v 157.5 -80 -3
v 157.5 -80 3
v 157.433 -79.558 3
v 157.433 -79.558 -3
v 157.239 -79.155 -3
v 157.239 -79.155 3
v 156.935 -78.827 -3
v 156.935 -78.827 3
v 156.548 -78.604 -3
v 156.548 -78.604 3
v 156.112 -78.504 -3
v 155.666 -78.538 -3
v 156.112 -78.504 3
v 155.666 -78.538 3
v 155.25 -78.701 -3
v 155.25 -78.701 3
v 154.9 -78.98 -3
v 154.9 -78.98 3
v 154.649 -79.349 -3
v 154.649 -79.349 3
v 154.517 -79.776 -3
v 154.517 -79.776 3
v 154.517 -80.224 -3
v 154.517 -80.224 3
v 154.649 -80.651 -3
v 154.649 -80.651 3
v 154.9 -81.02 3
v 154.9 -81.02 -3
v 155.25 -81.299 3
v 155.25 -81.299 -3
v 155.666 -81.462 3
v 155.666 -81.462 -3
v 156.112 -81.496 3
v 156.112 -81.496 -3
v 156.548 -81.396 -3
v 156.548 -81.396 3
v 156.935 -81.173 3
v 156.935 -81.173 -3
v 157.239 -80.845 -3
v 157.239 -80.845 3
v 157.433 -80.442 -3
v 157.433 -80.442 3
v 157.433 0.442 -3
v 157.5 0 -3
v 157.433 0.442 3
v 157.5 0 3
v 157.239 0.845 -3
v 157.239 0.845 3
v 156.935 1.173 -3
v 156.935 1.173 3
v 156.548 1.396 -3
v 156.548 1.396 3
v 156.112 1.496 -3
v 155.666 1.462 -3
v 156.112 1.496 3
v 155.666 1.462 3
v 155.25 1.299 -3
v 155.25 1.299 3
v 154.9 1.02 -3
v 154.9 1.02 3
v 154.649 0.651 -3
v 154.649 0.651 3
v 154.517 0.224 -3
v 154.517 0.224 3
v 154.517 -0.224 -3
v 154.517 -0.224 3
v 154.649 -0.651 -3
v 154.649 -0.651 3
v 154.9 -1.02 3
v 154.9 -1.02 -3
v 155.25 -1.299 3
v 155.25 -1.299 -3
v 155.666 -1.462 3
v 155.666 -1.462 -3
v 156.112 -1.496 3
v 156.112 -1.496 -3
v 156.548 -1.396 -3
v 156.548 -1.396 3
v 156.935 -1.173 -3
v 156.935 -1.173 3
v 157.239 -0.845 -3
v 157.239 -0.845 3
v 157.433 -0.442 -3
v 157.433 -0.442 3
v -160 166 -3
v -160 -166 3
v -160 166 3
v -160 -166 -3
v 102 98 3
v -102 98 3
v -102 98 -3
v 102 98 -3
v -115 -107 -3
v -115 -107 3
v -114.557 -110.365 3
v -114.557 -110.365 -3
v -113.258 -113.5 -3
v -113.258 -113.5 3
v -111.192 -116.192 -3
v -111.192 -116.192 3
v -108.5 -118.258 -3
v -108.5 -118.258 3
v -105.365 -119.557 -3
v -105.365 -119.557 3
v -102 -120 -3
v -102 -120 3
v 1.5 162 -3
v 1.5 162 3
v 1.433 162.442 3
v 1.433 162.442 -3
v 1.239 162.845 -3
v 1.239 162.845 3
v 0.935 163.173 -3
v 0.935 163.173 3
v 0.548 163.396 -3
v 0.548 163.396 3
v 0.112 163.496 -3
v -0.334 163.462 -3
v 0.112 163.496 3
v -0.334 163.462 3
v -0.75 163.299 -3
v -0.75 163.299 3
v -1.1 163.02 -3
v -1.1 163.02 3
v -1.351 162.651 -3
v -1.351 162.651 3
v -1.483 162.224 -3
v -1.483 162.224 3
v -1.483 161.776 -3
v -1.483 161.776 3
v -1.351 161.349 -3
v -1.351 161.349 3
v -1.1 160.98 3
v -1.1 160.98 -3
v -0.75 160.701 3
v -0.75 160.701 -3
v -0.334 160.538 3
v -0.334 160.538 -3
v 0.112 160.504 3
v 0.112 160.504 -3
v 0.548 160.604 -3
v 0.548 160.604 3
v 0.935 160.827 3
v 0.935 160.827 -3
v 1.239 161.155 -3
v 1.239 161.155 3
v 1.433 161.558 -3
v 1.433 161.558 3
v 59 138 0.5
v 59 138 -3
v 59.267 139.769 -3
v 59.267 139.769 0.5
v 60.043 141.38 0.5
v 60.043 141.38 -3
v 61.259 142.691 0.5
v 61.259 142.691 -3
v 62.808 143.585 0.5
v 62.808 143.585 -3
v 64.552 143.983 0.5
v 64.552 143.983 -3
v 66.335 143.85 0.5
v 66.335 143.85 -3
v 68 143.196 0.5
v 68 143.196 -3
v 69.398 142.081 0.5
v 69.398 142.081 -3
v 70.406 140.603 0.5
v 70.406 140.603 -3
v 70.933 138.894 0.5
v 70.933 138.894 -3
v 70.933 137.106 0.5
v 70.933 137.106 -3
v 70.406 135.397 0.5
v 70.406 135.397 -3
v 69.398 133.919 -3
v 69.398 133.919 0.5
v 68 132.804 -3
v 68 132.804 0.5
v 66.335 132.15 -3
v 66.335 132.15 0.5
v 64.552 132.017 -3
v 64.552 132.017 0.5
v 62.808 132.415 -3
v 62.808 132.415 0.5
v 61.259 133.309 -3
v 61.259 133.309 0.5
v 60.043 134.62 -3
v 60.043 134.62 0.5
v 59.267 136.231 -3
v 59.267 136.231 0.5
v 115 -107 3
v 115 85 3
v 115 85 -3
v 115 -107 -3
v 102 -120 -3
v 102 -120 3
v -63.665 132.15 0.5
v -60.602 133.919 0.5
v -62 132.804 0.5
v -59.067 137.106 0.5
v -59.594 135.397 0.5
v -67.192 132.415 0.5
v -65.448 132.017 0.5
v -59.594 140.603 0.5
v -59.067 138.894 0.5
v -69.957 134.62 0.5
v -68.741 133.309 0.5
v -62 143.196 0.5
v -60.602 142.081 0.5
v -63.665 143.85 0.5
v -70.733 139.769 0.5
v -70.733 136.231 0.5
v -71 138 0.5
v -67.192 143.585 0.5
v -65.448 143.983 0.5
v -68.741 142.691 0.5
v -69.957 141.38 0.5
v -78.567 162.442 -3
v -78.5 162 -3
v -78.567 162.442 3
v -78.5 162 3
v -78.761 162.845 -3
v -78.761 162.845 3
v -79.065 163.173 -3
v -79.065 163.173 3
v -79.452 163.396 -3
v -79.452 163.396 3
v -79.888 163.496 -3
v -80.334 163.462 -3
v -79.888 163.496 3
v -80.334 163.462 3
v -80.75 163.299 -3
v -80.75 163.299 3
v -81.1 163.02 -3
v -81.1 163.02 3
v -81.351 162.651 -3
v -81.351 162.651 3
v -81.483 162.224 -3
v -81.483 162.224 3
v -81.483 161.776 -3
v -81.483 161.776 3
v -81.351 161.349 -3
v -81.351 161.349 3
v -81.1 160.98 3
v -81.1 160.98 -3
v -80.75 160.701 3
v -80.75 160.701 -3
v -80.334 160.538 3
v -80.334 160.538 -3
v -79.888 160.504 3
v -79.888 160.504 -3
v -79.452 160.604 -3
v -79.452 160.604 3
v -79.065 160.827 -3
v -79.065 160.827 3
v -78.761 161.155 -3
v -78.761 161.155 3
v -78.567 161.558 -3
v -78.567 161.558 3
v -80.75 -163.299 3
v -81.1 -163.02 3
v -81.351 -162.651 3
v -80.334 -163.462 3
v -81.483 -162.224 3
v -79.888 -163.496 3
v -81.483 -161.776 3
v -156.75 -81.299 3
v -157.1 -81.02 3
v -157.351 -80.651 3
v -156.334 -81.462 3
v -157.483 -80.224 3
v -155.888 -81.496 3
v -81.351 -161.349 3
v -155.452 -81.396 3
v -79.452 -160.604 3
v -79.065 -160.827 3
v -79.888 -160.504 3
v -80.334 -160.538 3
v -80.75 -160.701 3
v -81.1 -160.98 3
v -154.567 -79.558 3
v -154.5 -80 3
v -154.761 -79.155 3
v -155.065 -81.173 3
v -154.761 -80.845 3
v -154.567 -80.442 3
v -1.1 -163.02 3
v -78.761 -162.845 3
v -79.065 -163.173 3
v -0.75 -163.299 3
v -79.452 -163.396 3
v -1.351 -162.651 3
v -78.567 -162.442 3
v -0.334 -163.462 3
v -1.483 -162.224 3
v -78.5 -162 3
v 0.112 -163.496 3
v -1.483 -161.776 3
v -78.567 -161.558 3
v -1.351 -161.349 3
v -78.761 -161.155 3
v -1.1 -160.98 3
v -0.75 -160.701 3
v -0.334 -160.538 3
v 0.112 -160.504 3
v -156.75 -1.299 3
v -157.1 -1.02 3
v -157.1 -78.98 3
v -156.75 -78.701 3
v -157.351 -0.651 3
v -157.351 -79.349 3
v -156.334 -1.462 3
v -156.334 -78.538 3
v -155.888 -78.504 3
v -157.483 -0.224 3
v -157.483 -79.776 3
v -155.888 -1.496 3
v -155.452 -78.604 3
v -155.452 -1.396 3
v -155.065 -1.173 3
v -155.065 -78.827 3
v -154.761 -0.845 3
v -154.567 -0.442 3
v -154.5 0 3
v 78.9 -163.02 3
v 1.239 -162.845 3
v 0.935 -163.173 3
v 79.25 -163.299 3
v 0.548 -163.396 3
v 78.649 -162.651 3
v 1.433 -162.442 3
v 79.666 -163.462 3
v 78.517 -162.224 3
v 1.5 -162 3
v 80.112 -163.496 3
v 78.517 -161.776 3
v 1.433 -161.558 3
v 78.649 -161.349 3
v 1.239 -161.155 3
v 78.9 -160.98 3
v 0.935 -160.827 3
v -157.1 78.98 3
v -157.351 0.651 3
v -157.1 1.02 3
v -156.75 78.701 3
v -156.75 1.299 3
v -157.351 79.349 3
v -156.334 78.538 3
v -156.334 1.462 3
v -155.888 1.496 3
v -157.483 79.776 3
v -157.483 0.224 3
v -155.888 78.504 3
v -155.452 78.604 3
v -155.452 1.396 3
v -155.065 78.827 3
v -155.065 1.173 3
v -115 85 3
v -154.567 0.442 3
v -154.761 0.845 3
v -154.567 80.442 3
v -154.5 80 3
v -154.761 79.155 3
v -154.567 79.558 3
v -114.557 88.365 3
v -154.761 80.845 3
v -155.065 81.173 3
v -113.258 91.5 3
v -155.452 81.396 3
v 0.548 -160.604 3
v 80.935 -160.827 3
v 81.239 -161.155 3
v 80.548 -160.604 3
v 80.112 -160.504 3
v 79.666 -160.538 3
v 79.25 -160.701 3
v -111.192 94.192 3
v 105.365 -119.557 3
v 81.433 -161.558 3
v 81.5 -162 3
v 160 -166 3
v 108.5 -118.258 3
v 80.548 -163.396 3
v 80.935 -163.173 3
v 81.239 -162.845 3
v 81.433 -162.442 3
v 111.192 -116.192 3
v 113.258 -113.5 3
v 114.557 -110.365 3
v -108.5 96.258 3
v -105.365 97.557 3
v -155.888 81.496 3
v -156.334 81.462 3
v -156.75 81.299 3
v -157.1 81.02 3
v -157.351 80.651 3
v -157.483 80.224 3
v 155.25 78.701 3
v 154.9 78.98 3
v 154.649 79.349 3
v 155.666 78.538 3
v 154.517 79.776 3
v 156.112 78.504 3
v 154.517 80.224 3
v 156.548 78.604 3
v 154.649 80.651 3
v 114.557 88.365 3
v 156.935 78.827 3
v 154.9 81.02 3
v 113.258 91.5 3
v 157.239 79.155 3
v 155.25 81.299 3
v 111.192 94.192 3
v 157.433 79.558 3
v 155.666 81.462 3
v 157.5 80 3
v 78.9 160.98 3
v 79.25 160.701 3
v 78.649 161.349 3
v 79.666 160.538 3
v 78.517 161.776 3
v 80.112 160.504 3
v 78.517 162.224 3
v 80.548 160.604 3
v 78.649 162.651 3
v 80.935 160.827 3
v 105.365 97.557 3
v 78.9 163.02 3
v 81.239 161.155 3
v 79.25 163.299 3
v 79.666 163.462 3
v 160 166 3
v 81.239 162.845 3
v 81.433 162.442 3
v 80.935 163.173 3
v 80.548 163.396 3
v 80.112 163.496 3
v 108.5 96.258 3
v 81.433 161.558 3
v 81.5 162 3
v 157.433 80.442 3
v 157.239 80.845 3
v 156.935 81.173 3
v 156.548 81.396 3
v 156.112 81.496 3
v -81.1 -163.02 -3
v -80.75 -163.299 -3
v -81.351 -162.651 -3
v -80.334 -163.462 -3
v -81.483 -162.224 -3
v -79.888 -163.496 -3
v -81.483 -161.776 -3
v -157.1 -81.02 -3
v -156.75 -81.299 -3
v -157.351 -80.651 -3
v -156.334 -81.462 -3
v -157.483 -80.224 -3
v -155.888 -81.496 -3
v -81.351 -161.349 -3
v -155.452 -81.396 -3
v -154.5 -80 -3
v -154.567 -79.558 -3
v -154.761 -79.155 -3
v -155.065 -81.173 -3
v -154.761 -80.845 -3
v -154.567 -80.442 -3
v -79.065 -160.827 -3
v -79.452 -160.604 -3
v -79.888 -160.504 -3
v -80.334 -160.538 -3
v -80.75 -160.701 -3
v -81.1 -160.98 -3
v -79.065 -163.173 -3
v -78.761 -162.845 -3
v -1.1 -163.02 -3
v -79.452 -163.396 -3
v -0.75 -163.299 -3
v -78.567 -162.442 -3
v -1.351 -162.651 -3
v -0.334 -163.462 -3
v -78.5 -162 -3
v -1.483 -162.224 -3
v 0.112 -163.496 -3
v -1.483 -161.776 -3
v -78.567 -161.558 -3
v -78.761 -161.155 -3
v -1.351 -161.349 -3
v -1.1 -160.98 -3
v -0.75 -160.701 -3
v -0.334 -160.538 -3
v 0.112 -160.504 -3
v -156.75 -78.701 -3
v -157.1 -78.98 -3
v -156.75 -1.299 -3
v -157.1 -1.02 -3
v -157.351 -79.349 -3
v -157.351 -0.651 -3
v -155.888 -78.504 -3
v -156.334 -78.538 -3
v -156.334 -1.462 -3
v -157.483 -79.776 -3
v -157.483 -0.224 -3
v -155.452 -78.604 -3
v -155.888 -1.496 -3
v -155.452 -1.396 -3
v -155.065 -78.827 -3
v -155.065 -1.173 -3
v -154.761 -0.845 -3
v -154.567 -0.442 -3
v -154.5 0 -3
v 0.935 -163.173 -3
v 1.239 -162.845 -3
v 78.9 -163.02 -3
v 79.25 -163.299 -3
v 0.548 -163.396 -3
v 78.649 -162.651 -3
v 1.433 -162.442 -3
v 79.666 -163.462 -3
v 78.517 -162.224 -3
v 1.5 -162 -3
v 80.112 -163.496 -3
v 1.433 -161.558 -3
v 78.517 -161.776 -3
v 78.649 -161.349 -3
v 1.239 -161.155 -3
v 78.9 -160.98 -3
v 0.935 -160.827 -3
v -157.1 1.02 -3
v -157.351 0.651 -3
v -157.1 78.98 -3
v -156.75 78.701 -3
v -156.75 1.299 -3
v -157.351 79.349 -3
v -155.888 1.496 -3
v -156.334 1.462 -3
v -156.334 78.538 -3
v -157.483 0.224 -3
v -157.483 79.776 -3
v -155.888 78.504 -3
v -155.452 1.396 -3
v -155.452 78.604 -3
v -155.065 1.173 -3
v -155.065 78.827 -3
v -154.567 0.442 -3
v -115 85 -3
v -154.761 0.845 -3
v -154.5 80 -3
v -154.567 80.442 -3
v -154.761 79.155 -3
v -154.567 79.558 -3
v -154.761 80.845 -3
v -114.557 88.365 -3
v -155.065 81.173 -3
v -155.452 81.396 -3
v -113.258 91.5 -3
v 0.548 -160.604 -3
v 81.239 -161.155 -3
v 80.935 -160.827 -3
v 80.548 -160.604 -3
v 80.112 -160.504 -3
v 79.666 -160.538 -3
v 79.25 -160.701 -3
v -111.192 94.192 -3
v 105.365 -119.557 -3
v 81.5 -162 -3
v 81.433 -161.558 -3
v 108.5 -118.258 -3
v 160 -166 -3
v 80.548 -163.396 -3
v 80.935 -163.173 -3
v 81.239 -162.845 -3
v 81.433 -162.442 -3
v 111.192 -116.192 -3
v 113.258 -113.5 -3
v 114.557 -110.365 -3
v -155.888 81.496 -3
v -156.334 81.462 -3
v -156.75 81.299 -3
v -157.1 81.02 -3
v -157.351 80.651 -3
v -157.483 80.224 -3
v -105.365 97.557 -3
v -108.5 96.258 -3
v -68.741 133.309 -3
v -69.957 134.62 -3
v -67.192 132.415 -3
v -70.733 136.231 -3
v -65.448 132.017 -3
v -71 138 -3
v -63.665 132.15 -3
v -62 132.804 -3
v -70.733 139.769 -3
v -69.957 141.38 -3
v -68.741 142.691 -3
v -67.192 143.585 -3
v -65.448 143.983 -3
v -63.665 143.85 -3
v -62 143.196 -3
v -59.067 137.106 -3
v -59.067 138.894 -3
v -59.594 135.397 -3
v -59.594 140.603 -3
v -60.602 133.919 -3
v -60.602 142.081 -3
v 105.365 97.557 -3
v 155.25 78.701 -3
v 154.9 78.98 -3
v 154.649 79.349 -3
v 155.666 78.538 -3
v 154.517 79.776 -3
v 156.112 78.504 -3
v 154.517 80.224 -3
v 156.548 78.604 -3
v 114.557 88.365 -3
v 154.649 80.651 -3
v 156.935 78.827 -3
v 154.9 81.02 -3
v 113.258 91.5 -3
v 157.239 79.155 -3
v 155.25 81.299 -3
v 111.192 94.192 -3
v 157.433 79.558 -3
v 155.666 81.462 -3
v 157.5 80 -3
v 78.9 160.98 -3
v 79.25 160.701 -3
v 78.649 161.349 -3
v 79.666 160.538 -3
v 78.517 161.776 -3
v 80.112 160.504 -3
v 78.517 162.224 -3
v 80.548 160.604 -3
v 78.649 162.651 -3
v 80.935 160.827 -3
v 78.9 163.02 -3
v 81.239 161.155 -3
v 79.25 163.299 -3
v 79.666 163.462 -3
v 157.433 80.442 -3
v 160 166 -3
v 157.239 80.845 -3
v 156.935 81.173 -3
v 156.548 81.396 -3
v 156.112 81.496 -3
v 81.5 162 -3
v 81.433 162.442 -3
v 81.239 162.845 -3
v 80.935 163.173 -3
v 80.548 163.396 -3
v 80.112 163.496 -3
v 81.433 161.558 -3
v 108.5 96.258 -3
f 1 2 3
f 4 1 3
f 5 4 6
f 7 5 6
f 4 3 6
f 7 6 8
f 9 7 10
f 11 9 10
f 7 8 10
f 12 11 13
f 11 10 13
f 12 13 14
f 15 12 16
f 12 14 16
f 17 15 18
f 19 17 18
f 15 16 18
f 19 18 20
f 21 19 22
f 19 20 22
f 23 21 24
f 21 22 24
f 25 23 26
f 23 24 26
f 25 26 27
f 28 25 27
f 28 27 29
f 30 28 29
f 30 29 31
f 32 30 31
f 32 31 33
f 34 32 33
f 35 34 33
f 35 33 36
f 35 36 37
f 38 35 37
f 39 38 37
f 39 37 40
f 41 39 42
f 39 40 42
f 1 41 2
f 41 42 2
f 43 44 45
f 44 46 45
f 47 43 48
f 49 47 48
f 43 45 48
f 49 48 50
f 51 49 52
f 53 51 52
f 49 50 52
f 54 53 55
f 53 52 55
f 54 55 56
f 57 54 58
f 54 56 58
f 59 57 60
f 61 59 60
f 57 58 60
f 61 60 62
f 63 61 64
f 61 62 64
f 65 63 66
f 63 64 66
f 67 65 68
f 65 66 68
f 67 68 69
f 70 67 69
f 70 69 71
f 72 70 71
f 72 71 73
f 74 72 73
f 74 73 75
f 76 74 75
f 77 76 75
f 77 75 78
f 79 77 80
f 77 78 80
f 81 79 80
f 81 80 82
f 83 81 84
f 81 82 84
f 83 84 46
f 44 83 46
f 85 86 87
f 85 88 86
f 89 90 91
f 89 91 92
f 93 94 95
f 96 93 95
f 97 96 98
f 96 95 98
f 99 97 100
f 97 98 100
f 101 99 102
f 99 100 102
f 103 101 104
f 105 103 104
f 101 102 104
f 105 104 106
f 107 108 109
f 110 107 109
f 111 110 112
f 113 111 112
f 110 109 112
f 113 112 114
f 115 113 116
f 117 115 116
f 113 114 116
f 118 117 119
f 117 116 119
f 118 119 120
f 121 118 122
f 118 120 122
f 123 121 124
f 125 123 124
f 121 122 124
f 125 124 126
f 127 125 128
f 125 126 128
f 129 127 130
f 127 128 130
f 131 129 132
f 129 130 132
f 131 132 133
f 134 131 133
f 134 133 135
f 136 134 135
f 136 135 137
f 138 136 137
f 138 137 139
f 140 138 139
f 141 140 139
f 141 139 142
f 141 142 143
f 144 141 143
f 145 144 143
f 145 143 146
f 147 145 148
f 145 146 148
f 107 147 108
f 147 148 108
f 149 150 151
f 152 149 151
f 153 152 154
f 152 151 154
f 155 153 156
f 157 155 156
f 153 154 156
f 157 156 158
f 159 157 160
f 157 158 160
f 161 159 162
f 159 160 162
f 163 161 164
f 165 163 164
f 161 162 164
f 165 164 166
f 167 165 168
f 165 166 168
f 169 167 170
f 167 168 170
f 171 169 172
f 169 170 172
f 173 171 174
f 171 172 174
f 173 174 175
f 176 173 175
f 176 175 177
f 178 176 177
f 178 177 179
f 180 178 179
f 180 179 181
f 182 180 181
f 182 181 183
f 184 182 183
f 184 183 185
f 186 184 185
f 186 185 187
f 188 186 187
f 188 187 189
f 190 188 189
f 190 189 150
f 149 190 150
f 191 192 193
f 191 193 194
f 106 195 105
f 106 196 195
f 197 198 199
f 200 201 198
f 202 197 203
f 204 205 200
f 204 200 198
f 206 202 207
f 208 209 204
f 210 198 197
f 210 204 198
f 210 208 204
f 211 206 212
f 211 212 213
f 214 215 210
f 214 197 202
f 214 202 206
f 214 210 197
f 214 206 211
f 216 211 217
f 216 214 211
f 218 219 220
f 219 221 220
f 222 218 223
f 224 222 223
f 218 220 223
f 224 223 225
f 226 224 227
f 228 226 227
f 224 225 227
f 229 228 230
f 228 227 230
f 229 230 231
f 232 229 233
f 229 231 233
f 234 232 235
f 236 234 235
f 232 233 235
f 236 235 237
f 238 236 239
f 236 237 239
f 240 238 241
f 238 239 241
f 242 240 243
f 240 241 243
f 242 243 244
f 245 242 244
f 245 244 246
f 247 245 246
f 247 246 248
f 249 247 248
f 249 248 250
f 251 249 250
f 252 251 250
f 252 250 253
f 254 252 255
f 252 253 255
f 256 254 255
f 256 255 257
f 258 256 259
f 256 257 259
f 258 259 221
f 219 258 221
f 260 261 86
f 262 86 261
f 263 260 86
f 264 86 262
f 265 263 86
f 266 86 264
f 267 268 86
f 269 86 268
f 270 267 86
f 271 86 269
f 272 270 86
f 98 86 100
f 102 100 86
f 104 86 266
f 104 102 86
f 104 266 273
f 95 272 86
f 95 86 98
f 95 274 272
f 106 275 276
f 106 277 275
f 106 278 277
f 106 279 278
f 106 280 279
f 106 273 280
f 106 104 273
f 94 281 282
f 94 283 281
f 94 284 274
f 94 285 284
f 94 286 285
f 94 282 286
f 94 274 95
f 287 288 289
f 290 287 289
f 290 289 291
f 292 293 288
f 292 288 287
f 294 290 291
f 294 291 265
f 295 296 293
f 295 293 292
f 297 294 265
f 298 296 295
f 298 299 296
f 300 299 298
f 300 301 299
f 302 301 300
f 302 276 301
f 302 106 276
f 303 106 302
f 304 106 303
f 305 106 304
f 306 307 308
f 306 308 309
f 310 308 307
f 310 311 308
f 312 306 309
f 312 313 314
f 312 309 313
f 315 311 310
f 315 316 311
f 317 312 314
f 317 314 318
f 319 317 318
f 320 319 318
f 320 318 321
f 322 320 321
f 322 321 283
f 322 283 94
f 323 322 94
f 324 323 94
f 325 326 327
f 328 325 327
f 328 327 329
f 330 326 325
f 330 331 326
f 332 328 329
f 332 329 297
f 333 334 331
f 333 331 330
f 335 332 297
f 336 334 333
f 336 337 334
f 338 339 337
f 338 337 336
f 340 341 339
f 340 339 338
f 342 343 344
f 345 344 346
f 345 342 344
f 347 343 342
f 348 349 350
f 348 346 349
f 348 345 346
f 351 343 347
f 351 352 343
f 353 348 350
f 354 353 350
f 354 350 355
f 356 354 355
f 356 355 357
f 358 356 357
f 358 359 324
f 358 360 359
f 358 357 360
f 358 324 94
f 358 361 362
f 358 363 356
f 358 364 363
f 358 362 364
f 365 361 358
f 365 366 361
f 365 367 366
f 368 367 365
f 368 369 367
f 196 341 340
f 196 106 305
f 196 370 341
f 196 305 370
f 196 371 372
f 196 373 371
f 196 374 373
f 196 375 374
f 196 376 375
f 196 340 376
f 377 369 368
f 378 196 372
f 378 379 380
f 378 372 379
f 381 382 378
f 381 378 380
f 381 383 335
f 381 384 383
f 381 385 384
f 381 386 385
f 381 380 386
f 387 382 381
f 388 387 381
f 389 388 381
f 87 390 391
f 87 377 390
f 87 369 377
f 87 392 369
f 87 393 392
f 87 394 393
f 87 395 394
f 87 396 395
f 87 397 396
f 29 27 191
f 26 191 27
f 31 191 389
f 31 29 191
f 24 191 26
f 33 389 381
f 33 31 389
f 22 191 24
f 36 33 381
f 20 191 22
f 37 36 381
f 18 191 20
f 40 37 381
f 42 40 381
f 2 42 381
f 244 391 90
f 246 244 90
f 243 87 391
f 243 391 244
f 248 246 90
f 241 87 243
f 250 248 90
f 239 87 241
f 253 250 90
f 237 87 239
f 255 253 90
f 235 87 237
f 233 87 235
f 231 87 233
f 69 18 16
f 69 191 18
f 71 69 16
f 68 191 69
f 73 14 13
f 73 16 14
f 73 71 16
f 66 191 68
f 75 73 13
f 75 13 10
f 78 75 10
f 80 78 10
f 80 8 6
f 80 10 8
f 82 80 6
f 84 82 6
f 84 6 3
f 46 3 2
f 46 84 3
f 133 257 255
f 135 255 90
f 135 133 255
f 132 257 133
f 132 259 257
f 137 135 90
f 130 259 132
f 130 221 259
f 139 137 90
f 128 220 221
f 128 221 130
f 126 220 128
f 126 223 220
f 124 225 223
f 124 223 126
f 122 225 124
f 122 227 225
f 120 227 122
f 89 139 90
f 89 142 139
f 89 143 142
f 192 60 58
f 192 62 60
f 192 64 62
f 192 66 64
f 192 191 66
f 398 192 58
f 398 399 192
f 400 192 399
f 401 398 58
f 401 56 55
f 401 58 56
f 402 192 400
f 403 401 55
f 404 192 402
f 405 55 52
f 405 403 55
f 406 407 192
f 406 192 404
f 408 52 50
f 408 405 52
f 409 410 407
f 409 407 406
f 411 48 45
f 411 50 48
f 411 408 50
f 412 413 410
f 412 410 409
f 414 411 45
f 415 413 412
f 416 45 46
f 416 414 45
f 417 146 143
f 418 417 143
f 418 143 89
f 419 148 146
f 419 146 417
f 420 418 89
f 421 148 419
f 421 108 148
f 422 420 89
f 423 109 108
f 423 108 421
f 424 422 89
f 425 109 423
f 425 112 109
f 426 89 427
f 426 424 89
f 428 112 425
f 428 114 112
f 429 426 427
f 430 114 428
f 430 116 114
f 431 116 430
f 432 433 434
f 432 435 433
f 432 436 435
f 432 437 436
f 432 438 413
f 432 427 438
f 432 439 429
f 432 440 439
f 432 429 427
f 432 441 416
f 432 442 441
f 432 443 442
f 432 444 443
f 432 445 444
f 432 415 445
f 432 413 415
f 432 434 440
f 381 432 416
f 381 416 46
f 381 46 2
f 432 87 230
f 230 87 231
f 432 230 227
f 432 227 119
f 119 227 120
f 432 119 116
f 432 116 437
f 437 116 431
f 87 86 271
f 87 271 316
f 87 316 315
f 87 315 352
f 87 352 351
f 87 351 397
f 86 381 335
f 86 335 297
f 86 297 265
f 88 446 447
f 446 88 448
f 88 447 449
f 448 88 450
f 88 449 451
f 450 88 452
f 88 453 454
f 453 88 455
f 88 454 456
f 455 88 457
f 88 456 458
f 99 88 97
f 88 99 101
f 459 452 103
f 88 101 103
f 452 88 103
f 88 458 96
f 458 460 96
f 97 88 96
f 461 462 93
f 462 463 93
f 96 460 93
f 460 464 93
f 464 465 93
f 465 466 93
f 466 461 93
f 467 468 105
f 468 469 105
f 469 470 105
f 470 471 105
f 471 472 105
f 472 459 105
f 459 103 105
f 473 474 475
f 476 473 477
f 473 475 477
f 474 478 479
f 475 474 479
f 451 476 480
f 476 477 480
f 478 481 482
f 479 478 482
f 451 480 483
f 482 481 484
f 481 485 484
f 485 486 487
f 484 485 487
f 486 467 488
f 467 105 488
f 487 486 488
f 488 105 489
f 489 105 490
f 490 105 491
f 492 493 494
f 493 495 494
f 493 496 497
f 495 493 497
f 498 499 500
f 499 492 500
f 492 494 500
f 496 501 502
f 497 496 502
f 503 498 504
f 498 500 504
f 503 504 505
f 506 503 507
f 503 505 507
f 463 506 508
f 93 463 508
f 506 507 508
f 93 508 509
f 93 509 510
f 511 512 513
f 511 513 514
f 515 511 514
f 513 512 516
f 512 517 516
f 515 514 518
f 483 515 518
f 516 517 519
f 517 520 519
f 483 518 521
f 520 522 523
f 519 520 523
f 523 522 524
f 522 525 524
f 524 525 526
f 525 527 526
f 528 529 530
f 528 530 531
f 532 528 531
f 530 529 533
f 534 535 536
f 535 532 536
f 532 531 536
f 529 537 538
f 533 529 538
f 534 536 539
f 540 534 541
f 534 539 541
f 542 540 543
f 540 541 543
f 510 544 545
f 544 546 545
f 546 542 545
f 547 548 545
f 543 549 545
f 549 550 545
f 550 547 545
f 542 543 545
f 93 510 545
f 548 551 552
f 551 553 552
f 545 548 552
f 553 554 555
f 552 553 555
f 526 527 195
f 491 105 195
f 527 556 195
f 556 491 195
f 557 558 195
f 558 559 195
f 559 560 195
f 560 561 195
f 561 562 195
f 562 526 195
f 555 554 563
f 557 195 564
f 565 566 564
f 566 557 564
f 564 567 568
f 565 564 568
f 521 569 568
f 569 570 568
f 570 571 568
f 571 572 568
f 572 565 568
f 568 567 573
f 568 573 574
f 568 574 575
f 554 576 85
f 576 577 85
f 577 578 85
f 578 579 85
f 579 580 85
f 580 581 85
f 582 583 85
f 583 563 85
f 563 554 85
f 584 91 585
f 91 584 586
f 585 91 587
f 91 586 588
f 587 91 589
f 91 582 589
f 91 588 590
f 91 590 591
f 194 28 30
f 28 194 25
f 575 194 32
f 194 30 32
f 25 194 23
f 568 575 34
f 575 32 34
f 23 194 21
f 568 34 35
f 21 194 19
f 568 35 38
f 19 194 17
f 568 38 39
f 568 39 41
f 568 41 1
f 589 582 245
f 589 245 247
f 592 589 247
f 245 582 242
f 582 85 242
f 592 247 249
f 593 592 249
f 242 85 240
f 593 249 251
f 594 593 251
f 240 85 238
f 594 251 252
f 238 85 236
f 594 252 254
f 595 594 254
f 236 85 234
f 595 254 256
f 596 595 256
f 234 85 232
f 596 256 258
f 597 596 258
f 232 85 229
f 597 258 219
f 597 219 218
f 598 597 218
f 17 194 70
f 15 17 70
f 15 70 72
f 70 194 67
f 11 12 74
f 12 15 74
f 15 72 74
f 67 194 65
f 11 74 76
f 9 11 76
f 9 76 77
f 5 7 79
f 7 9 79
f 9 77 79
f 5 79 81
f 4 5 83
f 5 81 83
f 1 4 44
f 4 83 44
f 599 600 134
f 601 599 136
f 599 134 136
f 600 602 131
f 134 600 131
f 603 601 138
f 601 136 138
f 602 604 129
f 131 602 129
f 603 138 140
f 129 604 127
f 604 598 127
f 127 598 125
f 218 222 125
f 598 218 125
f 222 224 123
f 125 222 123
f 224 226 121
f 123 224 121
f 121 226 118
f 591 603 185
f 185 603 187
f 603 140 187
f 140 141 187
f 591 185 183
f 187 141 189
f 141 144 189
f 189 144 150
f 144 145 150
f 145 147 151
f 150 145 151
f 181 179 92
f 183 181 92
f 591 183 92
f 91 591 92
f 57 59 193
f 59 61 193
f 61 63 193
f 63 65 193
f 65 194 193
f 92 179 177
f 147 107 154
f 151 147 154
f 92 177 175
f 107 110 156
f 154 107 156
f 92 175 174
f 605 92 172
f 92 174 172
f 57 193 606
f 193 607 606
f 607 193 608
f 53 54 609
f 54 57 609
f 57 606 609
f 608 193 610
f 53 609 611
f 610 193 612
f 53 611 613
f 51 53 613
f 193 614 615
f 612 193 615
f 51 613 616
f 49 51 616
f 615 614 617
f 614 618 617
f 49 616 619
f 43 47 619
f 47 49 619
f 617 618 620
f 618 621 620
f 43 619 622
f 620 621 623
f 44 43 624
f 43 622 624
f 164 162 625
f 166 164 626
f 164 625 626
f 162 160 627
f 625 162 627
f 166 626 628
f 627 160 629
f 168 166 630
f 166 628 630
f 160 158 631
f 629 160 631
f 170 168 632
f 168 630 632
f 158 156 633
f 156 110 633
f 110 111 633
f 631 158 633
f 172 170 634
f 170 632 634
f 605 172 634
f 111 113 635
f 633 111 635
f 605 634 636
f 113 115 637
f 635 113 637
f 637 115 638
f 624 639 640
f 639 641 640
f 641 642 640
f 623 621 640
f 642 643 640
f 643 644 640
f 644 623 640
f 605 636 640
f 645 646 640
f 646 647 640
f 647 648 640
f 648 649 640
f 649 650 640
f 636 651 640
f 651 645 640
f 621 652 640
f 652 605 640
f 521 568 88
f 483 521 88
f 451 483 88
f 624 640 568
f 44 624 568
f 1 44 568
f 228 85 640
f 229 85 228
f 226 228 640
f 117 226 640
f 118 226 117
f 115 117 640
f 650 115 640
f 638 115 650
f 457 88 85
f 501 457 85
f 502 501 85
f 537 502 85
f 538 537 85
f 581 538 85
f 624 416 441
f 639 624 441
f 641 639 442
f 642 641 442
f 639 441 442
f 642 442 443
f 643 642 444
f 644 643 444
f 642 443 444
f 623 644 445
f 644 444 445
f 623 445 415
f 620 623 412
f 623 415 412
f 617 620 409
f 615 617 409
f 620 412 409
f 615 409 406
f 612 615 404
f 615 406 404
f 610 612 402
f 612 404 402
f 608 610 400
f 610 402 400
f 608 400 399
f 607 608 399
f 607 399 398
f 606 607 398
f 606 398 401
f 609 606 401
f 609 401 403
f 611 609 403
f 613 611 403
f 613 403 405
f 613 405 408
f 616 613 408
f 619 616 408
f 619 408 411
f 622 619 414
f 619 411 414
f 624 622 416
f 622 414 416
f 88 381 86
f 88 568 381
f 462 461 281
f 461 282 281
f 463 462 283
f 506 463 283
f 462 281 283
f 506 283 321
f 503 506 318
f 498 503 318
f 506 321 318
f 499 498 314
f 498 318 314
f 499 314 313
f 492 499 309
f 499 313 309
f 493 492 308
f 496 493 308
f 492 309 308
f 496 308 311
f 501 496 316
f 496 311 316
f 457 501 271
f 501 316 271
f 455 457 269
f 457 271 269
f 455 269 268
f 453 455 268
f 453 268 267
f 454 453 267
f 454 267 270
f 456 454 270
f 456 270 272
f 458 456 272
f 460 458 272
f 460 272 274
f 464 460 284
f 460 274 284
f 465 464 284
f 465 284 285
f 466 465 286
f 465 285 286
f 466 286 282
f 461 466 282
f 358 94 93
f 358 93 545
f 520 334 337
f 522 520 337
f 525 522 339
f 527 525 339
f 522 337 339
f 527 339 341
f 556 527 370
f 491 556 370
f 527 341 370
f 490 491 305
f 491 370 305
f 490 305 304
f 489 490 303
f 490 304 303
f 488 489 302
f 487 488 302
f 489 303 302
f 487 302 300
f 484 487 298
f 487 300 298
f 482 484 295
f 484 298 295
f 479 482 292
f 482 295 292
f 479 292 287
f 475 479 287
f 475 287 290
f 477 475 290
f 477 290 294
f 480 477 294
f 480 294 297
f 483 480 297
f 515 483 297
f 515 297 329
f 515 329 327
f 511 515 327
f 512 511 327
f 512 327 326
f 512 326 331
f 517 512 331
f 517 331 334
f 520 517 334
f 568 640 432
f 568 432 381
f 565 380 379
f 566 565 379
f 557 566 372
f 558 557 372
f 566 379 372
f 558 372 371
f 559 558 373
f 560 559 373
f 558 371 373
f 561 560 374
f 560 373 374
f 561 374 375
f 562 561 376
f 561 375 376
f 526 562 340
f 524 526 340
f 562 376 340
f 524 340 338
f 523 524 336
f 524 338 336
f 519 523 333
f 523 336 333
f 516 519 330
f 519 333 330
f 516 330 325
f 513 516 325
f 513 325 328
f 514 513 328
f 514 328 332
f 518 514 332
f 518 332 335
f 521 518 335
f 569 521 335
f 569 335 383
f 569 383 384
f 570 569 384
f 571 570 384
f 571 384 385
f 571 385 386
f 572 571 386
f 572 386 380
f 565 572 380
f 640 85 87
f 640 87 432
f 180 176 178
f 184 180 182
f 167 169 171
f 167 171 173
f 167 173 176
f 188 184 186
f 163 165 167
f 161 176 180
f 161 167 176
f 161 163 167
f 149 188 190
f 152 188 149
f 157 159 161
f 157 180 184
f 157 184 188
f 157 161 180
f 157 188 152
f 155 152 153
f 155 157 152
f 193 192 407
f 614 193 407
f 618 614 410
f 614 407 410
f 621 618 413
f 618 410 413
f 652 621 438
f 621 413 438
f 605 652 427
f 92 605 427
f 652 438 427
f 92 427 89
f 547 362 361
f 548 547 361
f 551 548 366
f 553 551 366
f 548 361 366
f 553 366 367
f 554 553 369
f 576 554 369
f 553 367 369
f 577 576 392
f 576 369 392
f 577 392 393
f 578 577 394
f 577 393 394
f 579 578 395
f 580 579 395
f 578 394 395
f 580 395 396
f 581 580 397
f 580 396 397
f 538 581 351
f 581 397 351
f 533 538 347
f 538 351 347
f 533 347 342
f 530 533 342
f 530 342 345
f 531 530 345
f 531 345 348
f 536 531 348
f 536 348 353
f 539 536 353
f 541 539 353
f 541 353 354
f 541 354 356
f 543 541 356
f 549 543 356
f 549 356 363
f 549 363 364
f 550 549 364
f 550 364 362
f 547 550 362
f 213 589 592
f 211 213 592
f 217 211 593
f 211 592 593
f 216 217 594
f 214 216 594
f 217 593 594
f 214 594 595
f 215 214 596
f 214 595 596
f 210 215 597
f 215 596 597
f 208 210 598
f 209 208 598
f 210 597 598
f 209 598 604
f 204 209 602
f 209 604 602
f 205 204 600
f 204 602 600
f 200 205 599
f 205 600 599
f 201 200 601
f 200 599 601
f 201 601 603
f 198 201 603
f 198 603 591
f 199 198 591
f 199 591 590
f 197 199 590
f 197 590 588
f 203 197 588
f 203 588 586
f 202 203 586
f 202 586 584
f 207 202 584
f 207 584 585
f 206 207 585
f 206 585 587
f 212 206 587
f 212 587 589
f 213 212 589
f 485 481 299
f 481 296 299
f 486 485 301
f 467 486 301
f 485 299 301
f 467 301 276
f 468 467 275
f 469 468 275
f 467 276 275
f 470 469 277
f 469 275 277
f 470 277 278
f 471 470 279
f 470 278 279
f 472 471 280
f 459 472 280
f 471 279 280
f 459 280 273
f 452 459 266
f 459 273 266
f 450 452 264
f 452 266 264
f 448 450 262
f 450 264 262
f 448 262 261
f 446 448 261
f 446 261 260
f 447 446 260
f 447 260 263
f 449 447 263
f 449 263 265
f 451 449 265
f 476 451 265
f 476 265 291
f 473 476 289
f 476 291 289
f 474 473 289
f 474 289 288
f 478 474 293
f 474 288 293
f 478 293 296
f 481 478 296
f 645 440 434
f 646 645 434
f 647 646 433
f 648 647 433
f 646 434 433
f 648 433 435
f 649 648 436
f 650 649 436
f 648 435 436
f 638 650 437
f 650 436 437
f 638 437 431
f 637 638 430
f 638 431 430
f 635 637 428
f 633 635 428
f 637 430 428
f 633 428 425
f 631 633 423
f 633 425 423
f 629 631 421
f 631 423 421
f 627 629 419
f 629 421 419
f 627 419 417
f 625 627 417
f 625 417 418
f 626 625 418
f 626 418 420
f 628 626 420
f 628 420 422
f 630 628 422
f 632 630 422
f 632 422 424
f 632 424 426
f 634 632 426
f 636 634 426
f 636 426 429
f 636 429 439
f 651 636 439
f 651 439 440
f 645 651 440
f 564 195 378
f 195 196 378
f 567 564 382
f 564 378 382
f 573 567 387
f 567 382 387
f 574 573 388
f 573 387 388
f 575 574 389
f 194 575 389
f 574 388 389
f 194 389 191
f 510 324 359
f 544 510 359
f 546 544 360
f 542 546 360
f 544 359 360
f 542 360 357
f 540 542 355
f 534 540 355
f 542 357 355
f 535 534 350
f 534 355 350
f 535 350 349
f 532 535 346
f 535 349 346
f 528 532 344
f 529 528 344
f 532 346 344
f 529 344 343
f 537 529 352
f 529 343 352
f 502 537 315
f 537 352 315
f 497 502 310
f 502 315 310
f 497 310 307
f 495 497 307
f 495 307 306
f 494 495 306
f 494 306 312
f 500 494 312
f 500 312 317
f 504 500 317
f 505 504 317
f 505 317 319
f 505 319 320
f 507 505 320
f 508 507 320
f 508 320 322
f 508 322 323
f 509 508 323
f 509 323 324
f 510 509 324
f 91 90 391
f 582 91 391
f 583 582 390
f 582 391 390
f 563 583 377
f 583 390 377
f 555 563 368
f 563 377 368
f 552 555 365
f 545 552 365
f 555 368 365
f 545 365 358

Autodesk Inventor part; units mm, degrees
ref_plane "YZ Plane" through (0, 0, 0) normal (1, 0, 0) x (0, 1, 0)
ref_plane "XZ Plane" through (0, 0, 0) normal (0, 1, 0) x (-1, 0, 0)
ref_plane "XY Plane" through (0, 0, 0) normal (0, 0, 1) x (1, 0, 0)
sketch "Sketch1" plane through (0, 0, 0) normal (0, 0, 1) x (1, 0, 0)
  line L0 (-160, 166) -> (160, 166)
  line L1 (160, 166) -> (160, -166)
  line L2 (160, -166) -> (-160, -166)
  line L3 (-160, -166) -> (-160, 166)
  point P0 (0, 0)
  dimension "d0" = 320
  dimension "d1" = 332
  dimension "d2" = 160
  dimension "d3" = 166
extrude "Tykkelse" add sketch "Sketch1" along normal mid plane 6
sketch "Sketch2" plane through (0, 0, 3) normal (0, 0, 1) x (1, 0, 0)
  line L0 (-102, 98) -> (102, 98)
  line L1 (115, 85) -> (115, -107)
  line L2 (102, -120) -> (-102, -120)
  line L3 (-115, -107) -> (-115, 85)
  line L4 (160, -166) -> (160, 166) projected
  line L5 (-160, 166) -> (-160, -166) projected
  line L6 (-160, -166) -> (160, -166) projected
  line L7 (160, 166) -> (-160, 166) projected
  arc A0 (-102, 98) -> (-115, 85) centre (-102, 85) ccw
  arc A1 (115, 85) -> (102, 98) centre (102, 85) ccw
  arc A2 (102, -120) -> (115, -107) centre (102, -107) ccw
  arc A3 (-115, -107) -> (-102, -120) centre (-102, -107) ccw
  point P0 (0, 0)
  dimension "d6" = 45
  dimension "d7" = 45
  dimension "d8" = 46
  dimension "d9" = 68
  dimension "d10" = 13
  dimension "d20" = 218
  dimension "d21" = 230
extrude "Vindue" cut sketch "Sketch2" against normal up to surface (6 mm away) contours L0 A1 L1 A2 L2 A3 L3 A0
sketch "Sketch3" plane through (0, 0, -3) normal (0, 0, -1) x (-1, 0, 0)
  circle A0 centre (65, 138) radius 6
  circle A1 centre (-65, 138) radius 6
  line L0 (-65, 138) -> (65, 138) construction
  line L1 (160, 166) -> (-160, 166) projected
  point P0 (0, 0)
  dimension "d13" = 12
  dimension "d14" = 12
  dimension "d15" = 130
  dimension "d16" = 65
  dimension "d17" = 28
extrude "Ø12 mm huller" cut sketch "Sketch3" against normal blind 3.5
sketch "Sketch4" plane through (0, 0, 3) normal (0, 0, 1) x (1, 0, 0)
  line L0 (156, 162) -> (-156, 162) construction
  line L1 (-156, 162) -> (-156, -162) construction
  line L2 (-156, -162) -> (156, -162) construction
  line L3 (156, -162) -> (156, 162) construction
  circle A0 centre (-156, -80) radius 1.5
  circle A1 centre (-156, 0) radius 1.5
  circle A2 centre (-156, 80) radius 1.5
  circle A3 centre (-80, 162) radius 1.5
  circle A4 centre (0, 162) radius 1.5
  circle A5 centre (80, 162) radius 1.5
  circle A6 centre (156, 80) radius 1.5
  circle A7 centre (156, 0) radius 1.5
  circle A8 centre (156, -80) radius 1.5
  circle A9 centre (-80, -162) radius 1.5
  circle A10 centre (0, -162) radius 1.5
  circle A11 centre (80, -162) radius 1.5
  line L4 (-160, 166) -> (-160, -166) construction
  line L5 (-160, -166) -> (160, -166) construction
  line L6 (160, 166) -> (-160, 166) construction
  line L7 (160, -166) -> (160, 166) construction
  point P0 (0, 0)
  dimension "d22" = 3
  dimension "d23" = 3
  dimension "d24" = 3
  dimension "d25" = 3
  dimension "d26" = 3
  dimension "d27" = 3
  dimension "d28" = 3
  dimension "d29" = 3
  dimension "d30" = 3
  dimension "d31" = 3
  dimension "d32" = 3
  dimension "d33" = 3
  dimension "d34" = 4
  dimension "d35" = 4
  dimension "d36" = 4
  dimension "d37" = 4
  dimension "d38" = 240
  dimension "d39" = 160
  dimension "d40" = 80
  dimension "d41" = 80
  dimension "d42" = 160
  dimension "d43" = 240
  dimension "d44" = 86
  dimension "d45" = 166
  dimension "d46" = 246
  dimension "d47" = 246
  dimension "d48" = 166
  dimension "d49" = 86
extrude "Monteringshuller" cut sketch "Sketch4" against normal up to surface (6 mm away)
equation "\"d2\" = 0.5 * d0"
equation "\"d3\" = 0.5 * d1"
equation "\"d7\" = d6"
equation "\"d14\" = d13"
equation "\"d16\" = 0.5 * d15"
equation "\"d22\" = d23"
equation "\"d24\" = d23"
equation "\"d25\" = d23"
equation "\"d26\" = d23"
equation "\"d27\" = d23"
equation "\"d28\" = d23"
equation "\"d29\" = d23"
equation "\"d30\" = d23"
equation "\"d31\" = d23"
equation "\"d32\" = d23"
equation "\"d33\" = d23"
properties part number "Låg mk2"
